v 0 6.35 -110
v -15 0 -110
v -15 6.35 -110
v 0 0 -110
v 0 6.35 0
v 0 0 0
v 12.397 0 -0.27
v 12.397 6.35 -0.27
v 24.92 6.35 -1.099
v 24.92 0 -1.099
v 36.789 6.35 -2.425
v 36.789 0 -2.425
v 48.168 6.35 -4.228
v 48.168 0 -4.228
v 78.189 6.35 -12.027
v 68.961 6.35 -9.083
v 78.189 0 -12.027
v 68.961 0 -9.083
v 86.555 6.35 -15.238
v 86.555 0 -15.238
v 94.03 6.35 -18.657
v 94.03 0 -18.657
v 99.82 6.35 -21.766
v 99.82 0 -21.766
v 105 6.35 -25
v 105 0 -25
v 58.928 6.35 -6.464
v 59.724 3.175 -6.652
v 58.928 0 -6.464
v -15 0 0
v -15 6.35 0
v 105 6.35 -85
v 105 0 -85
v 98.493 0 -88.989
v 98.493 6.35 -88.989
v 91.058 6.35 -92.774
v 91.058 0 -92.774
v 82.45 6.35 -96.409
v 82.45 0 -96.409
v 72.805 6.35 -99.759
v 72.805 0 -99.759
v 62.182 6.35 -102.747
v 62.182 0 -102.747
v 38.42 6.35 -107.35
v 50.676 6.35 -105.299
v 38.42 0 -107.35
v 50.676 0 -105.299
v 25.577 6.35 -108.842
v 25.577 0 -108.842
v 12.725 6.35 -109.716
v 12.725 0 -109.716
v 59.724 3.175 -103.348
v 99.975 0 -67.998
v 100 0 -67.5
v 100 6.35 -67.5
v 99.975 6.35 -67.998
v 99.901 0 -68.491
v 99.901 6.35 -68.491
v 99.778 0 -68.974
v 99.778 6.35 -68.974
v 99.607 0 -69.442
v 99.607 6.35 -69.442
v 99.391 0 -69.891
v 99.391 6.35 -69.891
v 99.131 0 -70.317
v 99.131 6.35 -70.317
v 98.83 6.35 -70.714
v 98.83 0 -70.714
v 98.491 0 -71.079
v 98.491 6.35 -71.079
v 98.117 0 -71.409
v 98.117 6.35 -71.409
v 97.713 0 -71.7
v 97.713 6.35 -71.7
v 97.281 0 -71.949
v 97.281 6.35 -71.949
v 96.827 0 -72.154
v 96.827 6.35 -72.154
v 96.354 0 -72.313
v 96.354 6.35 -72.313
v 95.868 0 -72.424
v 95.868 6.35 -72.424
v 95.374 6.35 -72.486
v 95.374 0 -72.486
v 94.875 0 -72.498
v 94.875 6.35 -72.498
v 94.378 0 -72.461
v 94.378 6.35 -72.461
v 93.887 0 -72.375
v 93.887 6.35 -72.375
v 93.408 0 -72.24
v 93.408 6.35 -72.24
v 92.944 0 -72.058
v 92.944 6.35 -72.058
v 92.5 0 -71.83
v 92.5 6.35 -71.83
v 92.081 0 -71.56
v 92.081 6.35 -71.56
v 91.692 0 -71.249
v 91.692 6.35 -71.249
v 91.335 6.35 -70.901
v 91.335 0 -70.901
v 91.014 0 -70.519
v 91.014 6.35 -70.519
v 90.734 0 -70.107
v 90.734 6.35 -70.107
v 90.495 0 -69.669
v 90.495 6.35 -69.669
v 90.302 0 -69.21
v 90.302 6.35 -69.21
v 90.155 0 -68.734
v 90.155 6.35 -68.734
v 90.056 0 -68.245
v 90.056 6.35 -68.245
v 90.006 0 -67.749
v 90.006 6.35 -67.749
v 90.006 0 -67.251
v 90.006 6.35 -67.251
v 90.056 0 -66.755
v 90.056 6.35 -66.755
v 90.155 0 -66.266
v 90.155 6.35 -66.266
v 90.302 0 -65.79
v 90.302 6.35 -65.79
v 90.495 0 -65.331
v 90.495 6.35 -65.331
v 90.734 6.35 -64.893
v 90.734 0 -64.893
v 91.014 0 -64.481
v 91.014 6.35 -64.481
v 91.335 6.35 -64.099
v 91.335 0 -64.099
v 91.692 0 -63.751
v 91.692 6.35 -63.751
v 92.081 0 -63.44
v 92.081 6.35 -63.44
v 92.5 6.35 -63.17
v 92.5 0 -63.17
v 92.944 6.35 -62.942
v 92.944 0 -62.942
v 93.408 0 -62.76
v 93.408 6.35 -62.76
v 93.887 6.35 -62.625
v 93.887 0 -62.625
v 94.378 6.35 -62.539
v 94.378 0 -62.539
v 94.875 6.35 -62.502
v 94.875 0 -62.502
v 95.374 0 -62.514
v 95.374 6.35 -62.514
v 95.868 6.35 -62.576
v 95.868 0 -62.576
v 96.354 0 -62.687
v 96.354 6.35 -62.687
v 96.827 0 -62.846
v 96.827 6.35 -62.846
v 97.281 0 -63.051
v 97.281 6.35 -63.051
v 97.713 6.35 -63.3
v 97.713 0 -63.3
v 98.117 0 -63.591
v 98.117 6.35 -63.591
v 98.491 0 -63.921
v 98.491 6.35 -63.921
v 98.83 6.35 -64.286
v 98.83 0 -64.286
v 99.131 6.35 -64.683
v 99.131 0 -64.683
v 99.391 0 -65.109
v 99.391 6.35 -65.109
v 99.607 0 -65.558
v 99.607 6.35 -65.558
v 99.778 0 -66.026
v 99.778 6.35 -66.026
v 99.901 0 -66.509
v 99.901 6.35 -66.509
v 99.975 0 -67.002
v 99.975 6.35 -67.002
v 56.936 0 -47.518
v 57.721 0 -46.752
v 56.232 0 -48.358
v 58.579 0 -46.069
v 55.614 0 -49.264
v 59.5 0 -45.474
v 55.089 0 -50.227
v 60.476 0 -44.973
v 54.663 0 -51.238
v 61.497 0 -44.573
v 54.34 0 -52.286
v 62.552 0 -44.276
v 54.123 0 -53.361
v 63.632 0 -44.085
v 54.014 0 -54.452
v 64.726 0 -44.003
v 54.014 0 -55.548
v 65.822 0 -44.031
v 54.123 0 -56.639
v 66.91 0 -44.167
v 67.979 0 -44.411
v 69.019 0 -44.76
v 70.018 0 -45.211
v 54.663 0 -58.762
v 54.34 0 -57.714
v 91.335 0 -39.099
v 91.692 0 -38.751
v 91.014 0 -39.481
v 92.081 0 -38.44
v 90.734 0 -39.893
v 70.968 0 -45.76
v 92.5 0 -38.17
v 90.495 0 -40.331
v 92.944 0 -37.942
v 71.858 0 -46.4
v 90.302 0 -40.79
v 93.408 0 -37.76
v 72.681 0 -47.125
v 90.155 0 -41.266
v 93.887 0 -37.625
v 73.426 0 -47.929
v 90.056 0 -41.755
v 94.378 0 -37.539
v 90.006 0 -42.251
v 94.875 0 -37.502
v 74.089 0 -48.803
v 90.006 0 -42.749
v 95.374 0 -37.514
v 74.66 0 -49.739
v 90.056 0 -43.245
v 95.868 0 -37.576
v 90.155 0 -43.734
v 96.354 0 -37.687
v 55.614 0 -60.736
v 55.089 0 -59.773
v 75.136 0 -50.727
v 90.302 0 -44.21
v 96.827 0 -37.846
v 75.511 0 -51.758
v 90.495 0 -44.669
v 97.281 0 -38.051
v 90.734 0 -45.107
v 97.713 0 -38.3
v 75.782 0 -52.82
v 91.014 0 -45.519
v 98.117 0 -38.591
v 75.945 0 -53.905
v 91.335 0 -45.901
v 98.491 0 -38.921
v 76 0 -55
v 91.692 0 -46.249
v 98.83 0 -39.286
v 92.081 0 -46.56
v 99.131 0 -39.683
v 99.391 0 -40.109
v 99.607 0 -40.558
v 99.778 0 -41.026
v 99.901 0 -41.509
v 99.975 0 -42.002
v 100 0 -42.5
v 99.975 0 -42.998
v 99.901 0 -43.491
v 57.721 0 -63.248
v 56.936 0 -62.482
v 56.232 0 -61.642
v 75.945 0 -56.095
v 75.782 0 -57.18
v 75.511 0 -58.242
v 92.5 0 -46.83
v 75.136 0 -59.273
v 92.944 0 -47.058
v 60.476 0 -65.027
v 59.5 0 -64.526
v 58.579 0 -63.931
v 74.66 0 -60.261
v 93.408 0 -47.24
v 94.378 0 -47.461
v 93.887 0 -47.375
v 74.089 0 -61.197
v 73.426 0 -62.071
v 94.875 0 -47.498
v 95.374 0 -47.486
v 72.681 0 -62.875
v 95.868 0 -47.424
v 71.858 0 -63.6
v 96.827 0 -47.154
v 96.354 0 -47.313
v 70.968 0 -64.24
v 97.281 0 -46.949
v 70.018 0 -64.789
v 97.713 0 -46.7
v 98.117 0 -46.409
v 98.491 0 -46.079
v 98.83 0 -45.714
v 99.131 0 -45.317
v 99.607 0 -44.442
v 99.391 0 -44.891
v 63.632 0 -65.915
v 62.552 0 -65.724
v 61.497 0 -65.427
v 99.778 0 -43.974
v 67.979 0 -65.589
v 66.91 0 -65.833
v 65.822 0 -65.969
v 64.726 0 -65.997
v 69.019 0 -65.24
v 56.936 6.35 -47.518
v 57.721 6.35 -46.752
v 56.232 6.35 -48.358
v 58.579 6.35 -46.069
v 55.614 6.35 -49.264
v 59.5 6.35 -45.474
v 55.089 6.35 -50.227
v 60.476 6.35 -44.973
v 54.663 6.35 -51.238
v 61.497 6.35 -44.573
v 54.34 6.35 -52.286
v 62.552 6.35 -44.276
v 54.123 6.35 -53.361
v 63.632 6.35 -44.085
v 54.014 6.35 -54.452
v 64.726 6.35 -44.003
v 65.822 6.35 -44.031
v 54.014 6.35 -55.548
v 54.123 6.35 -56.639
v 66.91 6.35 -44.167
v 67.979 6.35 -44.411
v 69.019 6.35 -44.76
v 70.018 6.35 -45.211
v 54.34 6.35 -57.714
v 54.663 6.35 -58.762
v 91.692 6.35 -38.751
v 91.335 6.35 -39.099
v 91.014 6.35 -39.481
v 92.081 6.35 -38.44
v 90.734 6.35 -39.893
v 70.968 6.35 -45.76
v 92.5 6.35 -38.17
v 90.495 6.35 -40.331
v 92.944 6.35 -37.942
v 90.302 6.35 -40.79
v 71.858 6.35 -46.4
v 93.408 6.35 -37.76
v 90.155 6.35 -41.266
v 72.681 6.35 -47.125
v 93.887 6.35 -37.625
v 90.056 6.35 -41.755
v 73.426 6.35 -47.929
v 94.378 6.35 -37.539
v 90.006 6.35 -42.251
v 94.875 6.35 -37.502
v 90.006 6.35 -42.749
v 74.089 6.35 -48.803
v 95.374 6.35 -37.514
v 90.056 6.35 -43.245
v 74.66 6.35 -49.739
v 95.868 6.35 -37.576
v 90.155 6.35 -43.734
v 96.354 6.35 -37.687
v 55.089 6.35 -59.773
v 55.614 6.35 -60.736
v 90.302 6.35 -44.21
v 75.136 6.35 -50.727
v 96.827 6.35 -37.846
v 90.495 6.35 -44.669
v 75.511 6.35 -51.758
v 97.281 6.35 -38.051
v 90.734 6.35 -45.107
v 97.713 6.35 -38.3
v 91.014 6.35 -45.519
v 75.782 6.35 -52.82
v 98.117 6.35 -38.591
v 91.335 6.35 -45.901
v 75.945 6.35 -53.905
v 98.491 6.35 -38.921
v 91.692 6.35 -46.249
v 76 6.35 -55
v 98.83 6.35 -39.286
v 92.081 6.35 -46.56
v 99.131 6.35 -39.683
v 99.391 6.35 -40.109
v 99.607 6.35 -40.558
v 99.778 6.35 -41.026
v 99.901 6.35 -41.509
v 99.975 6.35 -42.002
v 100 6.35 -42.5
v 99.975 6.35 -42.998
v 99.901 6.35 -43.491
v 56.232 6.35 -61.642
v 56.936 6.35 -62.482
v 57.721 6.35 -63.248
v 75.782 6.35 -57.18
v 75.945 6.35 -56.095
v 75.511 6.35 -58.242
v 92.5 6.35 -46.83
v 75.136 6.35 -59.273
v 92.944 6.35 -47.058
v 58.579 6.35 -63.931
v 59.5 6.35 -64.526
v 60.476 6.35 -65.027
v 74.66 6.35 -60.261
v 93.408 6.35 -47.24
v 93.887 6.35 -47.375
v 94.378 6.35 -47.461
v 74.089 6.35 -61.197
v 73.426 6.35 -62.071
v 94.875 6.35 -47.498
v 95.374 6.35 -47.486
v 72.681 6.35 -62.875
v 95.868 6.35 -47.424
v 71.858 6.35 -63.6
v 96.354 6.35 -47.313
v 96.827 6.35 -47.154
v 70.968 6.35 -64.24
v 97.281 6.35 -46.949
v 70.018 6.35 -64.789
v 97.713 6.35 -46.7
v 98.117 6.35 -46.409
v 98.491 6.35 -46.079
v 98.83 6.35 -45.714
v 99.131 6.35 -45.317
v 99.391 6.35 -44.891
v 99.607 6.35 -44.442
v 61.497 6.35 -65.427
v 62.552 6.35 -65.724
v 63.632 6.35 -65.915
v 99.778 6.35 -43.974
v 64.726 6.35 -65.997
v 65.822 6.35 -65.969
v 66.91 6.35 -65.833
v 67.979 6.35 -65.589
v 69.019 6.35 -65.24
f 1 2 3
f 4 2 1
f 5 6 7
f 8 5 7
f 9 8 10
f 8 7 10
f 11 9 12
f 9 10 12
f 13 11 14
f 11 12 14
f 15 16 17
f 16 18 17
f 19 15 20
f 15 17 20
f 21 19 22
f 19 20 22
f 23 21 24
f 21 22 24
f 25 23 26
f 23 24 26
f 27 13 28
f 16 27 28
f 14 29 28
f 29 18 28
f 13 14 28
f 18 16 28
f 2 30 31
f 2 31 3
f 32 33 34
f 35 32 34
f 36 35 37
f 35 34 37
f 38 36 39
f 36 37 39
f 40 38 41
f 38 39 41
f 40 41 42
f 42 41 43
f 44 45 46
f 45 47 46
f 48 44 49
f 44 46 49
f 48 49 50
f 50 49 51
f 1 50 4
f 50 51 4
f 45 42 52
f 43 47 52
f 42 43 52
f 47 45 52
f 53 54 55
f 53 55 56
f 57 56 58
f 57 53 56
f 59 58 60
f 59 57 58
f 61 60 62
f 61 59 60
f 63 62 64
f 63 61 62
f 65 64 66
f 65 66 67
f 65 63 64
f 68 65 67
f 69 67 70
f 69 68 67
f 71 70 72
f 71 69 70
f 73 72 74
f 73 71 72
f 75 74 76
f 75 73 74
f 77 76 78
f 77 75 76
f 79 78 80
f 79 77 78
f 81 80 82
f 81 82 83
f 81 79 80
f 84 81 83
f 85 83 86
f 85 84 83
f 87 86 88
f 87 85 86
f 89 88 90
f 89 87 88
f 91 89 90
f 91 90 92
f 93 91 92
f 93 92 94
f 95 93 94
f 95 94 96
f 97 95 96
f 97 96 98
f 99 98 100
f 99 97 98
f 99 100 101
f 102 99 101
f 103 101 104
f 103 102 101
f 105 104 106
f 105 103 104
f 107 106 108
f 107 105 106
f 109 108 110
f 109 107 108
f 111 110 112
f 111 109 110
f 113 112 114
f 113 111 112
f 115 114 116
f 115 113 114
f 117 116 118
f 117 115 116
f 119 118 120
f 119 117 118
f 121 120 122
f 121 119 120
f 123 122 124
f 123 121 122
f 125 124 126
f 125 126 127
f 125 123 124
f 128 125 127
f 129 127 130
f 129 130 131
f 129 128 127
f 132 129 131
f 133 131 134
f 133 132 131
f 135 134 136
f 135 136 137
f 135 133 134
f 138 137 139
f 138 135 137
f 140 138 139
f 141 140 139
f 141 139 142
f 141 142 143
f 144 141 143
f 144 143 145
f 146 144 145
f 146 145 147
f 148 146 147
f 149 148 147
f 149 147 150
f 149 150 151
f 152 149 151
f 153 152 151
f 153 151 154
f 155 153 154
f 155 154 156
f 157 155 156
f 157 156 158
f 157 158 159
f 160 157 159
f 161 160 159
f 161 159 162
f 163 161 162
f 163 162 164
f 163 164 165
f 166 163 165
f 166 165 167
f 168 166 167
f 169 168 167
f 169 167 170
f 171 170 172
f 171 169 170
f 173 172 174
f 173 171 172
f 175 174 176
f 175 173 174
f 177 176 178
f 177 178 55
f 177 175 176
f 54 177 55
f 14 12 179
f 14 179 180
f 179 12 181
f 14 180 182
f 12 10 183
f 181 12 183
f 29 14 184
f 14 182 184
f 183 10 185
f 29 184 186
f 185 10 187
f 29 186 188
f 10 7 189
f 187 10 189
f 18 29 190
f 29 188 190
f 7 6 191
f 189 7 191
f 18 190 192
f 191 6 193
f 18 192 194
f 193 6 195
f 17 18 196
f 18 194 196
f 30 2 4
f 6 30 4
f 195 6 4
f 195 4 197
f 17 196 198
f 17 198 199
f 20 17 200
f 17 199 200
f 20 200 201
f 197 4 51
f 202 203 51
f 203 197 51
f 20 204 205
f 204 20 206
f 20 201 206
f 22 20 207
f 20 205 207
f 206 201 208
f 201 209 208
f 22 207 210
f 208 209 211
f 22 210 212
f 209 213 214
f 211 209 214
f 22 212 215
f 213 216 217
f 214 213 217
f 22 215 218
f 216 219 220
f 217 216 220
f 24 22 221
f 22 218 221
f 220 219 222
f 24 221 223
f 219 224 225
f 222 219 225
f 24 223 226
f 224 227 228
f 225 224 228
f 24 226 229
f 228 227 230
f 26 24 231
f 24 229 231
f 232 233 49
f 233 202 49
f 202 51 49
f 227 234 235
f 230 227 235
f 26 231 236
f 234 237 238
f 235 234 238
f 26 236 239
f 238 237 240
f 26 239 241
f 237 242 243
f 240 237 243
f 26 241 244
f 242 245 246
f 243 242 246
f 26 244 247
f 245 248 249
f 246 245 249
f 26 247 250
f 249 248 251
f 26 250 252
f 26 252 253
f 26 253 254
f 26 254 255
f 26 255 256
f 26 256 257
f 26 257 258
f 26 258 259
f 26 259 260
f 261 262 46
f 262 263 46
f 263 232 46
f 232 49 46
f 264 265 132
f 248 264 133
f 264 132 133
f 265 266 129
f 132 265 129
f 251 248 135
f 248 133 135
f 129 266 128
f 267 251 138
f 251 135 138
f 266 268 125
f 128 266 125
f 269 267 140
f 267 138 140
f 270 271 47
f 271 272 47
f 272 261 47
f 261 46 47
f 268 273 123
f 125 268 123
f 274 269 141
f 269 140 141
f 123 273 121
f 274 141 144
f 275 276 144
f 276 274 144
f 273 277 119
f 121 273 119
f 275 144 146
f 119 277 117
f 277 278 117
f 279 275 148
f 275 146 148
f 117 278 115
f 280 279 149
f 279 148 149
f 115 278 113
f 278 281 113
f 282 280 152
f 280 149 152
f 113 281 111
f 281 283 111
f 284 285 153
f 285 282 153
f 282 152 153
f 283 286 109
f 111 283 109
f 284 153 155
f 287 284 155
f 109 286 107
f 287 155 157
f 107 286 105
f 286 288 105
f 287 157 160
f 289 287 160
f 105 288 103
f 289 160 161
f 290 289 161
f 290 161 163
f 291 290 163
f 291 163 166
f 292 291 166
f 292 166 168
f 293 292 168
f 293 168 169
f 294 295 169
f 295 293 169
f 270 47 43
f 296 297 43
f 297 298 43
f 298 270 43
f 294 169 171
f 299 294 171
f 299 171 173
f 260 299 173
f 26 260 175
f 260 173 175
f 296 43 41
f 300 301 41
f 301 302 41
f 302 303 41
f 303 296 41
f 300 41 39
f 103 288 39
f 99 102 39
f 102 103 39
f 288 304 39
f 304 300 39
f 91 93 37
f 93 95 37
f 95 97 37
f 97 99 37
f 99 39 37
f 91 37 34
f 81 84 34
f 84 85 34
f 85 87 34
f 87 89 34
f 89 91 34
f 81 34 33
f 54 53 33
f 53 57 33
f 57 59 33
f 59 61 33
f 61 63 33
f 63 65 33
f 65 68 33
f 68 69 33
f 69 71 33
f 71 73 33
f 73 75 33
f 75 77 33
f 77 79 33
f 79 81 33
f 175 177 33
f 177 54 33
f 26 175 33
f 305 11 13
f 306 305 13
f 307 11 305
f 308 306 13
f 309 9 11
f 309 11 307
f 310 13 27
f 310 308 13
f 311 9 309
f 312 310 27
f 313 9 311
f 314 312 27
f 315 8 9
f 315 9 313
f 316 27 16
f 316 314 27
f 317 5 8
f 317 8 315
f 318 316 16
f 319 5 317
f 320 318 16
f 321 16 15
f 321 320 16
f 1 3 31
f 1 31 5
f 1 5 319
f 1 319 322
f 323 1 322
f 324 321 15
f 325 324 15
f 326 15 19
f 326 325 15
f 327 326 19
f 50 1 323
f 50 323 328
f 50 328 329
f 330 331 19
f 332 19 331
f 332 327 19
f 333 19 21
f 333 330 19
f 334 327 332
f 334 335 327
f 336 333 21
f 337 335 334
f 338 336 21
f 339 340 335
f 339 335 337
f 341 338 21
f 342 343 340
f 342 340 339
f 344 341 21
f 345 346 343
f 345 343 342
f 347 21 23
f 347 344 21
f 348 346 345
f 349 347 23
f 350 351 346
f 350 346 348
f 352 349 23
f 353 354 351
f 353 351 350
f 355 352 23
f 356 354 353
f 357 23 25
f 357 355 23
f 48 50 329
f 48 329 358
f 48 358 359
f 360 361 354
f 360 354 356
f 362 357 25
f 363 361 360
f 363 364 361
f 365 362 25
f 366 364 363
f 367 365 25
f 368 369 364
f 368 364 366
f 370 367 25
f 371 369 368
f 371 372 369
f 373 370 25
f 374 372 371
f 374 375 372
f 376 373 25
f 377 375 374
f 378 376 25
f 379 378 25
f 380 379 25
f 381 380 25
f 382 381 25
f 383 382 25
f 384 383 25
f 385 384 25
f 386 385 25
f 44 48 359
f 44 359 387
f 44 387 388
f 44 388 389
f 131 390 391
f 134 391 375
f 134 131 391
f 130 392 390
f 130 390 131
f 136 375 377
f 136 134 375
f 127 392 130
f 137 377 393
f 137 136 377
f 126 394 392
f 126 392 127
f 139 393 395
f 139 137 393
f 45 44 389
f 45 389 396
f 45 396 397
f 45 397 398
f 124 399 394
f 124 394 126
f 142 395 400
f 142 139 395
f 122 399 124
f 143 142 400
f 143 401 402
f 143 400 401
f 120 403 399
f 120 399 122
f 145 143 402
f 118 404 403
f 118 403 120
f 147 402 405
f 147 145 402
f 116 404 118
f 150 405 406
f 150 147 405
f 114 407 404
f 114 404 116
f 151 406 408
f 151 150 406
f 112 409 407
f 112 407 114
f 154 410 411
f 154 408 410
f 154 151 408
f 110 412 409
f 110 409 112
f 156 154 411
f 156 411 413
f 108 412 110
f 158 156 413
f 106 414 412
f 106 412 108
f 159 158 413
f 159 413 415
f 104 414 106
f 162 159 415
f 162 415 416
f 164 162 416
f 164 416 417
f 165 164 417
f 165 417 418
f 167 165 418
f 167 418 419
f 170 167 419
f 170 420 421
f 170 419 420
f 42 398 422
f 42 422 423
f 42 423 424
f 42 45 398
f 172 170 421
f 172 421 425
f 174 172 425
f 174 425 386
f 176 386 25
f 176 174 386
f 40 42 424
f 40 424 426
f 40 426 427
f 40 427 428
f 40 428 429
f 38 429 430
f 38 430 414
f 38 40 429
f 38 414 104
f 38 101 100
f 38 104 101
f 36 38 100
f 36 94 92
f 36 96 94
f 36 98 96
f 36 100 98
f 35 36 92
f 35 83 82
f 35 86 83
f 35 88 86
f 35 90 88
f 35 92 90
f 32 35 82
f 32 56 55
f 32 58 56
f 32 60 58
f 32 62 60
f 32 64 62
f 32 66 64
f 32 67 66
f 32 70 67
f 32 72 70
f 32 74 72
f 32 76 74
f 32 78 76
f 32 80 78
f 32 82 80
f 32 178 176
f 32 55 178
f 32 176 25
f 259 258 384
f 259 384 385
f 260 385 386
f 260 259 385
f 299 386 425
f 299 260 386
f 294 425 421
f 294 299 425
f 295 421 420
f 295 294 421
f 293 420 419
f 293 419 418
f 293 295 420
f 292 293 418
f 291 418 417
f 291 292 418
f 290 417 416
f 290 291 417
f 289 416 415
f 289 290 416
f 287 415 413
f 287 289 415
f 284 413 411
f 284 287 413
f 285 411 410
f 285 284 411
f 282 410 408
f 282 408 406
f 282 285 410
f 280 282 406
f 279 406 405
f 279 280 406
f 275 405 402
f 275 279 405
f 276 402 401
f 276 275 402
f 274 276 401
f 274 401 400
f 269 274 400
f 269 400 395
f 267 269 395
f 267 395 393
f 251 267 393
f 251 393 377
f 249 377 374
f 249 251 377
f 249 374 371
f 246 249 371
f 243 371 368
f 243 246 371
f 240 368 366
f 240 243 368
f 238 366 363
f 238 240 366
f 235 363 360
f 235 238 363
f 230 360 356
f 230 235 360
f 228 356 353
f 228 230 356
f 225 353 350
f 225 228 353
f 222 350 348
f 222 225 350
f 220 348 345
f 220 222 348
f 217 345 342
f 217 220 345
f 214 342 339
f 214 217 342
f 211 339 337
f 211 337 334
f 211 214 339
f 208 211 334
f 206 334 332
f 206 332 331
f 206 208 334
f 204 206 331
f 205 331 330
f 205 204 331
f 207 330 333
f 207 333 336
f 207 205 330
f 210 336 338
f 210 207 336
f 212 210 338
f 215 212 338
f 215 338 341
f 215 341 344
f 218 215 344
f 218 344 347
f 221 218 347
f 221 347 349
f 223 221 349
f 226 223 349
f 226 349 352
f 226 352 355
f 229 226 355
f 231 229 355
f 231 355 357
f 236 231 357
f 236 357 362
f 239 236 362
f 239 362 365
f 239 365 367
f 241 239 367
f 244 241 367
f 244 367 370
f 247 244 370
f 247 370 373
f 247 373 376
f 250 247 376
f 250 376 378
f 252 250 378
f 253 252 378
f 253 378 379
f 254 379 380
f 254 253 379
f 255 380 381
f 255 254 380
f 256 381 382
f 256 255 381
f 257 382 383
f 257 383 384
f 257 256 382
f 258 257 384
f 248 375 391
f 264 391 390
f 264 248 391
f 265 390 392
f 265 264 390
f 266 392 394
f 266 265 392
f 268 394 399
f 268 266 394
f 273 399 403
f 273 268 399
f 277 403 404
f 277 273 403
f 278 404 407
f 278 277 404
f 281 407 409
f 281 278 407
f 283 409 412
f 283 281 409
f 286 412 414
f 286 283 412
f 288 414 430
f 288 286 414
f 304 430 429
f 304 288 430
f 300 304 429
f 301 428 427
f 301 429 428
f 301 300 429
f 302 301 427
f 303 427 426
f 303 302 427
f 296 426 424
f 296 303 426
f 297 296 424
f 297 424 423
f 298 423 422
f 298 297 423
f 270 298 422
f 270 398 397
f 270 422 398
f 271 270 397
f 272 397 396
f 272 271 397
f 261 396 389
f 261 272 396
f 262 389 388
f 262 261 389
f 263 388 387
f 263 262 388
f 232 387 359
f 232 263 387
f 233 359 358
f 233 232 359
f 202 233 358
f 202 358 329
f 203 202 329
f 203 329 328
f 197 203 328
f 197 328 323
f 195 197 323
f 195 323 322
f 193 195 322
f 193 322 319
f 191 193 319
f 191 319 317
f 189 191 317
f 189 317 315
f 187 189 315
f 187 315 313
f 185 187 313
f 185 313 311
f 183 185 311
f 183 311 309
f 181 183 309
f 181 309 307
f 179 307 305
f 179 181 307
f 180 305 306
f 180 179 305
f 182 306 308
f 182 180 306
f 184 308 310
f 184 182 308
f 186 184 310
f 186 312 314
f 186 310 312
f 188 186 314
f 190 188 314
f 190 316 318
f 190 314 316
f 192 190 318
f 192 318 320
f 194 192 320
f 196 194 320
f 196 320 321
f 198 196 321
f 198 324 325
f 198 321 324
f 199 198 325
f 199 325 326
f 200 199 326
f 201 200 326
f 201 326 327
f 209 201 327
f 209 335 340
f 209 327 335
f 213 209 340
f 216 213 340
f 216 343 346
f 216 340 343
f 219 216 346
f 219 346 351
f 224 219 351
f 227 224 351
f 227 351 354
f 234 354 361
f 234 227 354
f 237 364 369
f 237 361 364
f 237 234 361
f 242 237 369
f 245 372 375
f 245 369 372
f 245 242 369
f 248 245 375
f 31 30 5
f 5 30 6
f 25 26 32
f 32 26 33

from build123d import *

# Parameters (mm, degrees)
BOSS_EXTRUDE1_DEPTH = 6.35
SKETCH2_R           = 5
CUT_EXTRUDE1_DEPTH  = 6.35
SKETCH3_R           = 11
CUT_EXTRUDE2_DEPTH  = 7.3500001
SKETCH4_W           = 15
SKETCH4_H           = 110
BOSS_EXTRUDE3_DEPTH = 6.35


with BuildPart() as part:
    # Sketch1 → Boss-Extrude1 (new body)
    with BuildSketch(Plane(origin=(0, 0, 0), x_dir=(1, 0, 0), z_dir=(0, 1, 0))):
        with BuildLine():
            Line((0, 110), (0, 0))
            add(Edge.make_bspline(
                [(0, 0), (67.941176471, 0), (105, 25)],
                knots=[1.570796327, 1.570796327, 1.570796327, 2.564661308, 2.564661308, 2.564661308], degree=2, weights=[1, 0.879049073, 1]))
            Line((105, 25), (105, 85))
            add(Edge.make_bspline(
                [(105, 85), (67.941176471, 110), (0, 110)],
                knots=[3.718523999, 3.718523999, 3.718523999, 4.71238898, 4.71238898, 4.71238898], degree=2, weights=[1, 0.879049073, 1]))
        make_face()
    extrude(amount=BOSS_EXTRUDE1_DEPTH)

    # Sketch2 → Cut-Extrude1 (cut)
    with BuildSketch(Plane(origin=(0, 0, 0), x_dir=(1, 0, 0), z_dir=(0, 1, 0))):
        with Locations((95, 67.5)):
            Circle(SKETCH2_R)
        with Locations((95, 42.5)):
            Circle(SKETCH2_R)
    extrude(amount=CUT_EXTRUDE1_DEPTH, mode=Mode.SUBTRACT)

    # Sketch3 → Cut-Extrude2 (cut, through all)
    with BuildSketch(Plane(origin=(0, 0, 0), x_dir=(1, 0, 0), z_dir=(0, 1, 0))):
        with Locations((65, 55)):
            Circle(SKETCH3_R)
    extrude(amount=CUT_EXTRUDE2_DEPTH, mode=Mode.SUBTRACT)

    # Sketch4 → Boss-Extrude3 (add)
    with BuildSketch(Plane(origin=(0, 0, 0), x_dir=(1, 0, 0), z_dir=(0, 1, 0))):
        with Locations((-7.5, 55)):
            Rectangle(SKETCH4_W, SKETCH4_H)
    extrude(amount=BOSS_EXTRUDE3_DEPTH)


solid = part.part
